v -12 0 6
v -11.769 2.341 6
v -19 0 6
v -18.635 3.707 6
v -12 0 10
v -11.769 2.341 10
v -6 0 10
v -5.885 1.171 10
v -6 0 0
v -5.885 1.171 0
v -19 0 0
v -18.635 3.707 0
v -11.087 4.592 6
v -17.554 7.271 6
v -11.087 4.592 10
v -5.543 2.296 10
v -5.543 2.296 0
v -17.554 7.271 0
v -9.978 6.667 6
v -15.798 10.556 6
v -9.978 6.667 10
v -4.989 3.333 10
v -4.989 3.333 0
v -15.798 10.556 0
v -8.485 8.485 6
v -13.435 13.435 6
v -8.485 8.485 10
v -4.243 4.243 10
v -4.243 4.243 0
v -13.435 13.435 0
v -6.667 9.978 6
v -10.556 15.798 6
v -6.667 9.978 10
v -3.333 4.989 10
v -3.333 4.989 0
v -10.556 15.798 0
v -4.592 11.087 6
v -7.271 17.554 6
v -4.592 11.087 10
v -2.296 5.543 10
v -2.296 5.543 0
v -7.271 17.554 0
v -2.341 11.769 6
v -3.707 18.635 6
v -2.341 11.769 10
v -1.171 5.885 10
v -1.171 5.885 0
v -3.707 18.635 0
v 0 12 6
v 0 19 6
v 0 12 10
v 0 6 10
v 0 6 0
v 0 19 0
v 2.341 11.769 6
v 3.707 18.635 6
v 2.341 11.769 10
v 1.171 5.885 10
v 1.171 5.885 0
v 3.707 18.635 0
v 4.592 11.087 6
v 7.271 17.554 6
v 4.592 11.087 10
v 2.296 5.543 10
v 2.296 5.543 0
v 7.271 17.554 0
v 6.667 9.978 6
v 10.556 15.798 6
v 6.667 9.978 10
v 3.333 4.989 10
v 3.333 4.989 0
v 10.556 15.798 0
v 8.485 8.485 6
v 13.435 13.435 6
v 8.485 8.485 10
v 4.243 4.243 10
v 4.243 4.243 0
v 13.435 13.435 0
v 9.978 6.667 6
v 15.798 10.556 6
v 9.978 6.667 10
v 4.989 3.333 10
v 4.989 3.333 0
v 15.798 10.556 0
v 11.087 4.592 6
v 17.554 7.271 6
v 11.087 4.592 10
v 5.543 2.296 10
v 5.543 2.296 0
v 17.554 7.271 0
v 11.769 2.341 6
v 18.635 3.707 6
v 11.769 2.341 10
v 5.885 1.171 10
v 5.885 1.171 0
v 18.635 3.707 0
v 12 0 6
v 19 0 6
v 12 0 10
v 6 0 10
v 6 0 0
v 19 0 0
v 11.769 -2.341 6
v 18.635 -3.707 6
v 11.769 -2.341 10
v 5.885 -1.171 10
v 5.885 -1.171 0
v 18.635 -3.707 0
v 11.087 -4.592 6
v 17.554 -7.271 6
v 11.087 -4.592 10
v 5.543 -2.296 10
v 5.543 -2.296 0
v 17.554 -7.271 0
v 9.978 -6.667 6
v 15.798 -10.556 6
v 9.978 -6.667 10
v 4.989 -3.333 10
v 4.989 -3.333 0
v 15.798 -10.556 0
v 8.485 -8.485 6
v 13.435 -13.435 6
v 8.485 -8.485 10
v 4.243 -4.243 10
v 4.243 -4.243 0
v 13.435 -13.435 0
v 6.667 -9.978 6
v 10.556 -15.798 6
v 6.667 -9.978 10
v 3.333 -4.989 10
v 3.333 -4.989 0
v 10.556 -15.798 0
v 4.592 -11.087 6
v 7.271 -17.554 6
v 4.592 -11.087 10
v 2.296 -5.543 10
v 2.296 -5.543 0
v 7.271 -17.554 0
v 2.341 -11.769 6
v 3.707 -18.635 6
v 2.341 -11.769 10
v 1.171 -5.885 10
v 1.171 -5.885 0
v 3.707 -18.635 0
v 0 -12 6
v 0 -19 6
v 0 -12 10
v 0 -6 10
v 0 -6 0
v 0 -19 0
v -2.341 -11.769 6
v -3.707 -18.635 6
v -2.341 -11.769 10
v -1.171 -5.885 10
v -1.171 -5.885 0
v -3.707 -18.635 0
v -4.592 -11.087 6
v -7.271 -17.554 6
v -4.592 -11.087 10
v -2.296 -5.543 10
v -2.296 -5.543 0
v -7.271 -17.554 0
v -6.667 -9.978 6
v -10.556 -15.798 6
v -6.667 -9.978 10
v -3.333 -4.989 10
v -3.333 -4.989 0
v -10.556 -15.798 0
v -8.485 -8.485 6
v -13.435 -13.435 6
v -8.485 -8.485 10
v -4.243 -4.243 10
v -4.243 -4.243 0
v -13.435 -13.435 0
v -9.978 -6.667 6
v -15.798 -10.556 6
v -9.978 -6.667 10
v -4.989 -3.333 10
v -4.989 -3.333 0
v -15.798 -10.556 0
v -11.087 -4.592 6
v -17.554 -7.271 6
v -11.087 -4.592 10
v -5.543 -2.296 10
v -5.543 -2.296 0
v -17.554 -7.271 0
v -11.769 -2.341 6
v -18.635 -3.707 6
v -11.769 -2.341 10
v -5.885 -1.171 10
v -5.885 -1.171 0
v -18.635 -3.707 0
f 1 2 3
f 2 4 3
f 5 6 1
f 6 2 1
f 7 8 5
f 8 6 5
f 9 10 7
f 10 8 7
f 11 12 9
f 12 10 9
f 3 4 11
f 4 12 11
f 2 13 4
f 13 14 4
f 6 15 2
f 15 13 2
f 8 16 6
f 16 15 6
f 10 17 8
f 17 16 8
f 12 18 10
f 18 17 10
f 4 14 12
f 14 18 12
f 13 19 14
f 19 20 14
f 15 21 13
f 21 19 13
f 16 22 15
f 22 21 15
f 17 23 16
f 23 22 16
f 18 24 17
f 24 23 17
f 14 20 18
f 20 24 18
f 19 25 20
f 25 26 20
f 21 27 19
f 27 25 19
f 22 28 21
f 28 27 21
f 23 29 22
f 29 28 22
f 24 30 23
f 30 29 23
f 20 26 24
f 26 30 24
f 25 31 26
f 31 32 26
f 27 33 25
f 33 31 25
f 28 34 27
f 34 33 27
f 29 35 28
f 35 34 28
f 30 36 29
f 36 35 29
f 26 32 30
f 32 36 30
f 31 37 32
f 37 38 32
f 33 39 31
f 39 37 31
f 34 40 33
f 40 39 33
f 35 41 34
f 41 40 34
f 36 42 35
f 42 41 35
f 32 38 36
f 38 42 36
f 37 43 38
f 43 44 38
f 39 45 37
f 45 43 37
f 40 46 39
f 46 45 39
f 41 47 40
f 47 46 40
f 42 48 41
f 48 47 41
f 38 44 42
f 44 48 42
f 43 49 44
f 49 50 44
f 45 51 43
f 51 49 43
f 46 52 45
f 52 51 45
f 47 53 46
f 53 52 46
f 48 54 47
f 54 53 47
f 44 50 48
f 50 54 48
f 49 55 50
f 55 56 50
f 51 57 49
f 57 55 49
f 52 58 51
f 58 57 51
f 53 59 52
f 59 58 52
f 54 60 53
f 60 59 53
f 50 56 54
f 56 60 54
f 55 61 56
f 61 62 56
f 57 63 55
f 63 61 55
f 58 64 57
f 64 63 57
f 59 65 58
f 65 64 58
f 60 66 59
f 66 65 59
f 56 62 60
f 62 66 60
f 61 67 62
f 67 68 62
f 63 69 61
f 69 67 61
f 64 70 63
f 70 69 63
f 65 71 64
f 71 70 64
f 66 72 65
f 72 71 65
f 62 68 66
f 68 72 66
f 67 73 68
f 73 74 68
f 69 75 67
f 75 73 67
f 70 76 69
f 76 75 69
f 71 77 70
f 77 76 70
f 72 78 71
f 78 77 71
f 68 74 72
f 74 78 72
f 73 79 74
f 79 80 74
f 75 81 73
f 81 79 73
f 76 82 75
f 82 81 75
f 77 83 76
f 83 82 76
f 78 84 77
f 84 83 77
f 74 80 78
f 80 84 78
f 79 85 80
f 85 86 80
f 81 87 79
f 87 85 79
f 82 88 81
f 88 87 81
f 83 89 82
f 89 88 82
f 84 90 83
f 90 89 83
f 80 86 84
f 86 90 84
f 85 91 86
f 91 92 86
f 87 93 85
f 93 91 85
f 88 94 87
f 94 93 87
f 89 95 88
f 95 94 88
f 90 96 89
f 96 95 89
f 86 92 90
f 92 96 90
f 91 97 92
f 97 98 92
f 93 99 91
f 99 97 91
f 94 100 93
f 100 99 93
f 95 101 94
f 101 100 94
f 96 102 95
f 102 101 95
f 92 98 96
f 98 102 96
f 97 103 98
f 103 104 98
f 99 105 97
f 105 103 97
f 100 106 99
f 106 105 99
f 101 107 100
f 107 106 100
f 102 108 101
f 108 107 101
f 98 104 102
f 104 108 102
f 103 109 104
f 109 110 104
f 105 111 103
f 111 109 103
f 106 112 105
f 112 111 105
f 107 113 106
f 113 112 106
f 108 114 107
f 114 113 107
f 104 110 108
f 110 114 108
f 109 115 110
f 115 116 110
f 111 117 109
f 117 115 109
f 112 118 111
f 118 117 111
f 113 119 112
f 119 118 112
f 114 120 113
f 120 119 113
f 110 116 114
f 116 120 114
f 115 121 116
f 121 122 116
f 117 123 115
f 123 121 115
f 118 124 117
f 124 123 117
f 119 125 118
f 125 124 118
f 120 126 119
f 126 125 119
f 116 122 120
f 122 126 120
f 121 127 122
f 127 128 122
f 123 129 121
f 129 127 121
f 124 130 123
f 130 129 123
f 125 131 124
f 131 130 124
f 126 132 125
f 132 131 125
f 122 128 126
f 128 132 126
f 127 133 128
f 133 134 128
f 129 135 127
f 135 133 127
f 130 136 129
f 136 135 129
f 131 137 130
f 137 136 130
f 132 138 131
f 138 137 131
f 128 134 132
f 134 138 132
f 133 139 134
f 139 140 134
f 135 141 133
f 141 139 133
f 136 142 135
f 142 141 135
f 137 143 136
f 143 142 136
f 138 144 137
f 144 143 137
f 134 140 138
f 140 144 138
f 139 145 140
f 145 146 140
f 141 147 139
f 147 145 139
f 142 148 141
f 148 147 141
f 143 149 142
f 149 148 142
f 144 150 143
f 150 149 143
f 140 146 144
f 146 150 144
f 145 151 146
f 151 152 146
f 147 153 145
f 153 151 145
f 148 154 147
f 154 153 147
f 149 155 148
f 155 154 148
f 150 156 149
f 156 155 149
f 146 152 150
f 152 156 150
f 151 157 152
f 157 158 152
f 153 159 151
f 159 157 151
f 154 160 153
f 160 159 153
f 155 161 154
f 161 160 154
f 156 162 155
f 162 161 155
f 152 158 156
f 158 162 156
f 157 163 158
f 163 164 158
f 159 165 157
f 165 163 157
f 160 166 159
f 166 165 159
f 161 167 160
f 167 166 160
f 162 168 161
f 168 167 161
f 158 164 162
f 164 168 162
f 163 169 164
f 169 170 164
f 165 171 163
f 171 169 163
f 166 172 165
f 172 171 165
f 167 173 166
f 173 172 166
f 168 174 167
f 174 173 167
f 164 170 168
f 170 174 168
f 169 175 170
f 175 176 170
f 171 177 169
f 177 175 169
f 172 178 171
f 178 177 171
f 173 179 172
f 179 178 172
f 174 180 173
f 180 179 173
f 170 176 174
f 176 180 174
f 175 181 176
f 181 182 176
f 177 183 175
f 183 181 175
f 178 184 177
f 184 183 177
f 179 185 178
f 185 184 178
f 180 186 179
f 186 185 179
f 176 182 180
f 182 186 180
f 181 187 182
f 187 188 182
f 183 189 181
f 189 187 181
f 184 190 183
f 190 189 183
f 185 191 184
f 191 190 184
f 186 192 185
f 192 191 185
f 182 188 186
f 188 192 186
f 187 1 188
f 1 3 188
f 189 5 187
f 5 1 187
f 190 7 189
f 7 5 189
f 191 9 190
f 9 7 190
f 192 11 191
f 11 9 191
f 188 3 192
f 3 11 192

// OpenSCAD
$fn = 32;

// ----------------------------------------------------------------------
// Arc stop: collar, 10 mm thick
// ----------------------------------------------------------------------

// --- parameters (mm) ---
revolve_angle = 360;      // full turn around the Z axis
profile_points = 6;       // points of the closed outline

profile = [[6, 0], [19, 0], [19, 6], [12, 6], [12, 10], [6, 10]];  // single closed polygon, 6 points, counter clockwise

// --- the one profile operation ---
rotate_extrude(angle = revolve_angle) polygon(points = profile);
